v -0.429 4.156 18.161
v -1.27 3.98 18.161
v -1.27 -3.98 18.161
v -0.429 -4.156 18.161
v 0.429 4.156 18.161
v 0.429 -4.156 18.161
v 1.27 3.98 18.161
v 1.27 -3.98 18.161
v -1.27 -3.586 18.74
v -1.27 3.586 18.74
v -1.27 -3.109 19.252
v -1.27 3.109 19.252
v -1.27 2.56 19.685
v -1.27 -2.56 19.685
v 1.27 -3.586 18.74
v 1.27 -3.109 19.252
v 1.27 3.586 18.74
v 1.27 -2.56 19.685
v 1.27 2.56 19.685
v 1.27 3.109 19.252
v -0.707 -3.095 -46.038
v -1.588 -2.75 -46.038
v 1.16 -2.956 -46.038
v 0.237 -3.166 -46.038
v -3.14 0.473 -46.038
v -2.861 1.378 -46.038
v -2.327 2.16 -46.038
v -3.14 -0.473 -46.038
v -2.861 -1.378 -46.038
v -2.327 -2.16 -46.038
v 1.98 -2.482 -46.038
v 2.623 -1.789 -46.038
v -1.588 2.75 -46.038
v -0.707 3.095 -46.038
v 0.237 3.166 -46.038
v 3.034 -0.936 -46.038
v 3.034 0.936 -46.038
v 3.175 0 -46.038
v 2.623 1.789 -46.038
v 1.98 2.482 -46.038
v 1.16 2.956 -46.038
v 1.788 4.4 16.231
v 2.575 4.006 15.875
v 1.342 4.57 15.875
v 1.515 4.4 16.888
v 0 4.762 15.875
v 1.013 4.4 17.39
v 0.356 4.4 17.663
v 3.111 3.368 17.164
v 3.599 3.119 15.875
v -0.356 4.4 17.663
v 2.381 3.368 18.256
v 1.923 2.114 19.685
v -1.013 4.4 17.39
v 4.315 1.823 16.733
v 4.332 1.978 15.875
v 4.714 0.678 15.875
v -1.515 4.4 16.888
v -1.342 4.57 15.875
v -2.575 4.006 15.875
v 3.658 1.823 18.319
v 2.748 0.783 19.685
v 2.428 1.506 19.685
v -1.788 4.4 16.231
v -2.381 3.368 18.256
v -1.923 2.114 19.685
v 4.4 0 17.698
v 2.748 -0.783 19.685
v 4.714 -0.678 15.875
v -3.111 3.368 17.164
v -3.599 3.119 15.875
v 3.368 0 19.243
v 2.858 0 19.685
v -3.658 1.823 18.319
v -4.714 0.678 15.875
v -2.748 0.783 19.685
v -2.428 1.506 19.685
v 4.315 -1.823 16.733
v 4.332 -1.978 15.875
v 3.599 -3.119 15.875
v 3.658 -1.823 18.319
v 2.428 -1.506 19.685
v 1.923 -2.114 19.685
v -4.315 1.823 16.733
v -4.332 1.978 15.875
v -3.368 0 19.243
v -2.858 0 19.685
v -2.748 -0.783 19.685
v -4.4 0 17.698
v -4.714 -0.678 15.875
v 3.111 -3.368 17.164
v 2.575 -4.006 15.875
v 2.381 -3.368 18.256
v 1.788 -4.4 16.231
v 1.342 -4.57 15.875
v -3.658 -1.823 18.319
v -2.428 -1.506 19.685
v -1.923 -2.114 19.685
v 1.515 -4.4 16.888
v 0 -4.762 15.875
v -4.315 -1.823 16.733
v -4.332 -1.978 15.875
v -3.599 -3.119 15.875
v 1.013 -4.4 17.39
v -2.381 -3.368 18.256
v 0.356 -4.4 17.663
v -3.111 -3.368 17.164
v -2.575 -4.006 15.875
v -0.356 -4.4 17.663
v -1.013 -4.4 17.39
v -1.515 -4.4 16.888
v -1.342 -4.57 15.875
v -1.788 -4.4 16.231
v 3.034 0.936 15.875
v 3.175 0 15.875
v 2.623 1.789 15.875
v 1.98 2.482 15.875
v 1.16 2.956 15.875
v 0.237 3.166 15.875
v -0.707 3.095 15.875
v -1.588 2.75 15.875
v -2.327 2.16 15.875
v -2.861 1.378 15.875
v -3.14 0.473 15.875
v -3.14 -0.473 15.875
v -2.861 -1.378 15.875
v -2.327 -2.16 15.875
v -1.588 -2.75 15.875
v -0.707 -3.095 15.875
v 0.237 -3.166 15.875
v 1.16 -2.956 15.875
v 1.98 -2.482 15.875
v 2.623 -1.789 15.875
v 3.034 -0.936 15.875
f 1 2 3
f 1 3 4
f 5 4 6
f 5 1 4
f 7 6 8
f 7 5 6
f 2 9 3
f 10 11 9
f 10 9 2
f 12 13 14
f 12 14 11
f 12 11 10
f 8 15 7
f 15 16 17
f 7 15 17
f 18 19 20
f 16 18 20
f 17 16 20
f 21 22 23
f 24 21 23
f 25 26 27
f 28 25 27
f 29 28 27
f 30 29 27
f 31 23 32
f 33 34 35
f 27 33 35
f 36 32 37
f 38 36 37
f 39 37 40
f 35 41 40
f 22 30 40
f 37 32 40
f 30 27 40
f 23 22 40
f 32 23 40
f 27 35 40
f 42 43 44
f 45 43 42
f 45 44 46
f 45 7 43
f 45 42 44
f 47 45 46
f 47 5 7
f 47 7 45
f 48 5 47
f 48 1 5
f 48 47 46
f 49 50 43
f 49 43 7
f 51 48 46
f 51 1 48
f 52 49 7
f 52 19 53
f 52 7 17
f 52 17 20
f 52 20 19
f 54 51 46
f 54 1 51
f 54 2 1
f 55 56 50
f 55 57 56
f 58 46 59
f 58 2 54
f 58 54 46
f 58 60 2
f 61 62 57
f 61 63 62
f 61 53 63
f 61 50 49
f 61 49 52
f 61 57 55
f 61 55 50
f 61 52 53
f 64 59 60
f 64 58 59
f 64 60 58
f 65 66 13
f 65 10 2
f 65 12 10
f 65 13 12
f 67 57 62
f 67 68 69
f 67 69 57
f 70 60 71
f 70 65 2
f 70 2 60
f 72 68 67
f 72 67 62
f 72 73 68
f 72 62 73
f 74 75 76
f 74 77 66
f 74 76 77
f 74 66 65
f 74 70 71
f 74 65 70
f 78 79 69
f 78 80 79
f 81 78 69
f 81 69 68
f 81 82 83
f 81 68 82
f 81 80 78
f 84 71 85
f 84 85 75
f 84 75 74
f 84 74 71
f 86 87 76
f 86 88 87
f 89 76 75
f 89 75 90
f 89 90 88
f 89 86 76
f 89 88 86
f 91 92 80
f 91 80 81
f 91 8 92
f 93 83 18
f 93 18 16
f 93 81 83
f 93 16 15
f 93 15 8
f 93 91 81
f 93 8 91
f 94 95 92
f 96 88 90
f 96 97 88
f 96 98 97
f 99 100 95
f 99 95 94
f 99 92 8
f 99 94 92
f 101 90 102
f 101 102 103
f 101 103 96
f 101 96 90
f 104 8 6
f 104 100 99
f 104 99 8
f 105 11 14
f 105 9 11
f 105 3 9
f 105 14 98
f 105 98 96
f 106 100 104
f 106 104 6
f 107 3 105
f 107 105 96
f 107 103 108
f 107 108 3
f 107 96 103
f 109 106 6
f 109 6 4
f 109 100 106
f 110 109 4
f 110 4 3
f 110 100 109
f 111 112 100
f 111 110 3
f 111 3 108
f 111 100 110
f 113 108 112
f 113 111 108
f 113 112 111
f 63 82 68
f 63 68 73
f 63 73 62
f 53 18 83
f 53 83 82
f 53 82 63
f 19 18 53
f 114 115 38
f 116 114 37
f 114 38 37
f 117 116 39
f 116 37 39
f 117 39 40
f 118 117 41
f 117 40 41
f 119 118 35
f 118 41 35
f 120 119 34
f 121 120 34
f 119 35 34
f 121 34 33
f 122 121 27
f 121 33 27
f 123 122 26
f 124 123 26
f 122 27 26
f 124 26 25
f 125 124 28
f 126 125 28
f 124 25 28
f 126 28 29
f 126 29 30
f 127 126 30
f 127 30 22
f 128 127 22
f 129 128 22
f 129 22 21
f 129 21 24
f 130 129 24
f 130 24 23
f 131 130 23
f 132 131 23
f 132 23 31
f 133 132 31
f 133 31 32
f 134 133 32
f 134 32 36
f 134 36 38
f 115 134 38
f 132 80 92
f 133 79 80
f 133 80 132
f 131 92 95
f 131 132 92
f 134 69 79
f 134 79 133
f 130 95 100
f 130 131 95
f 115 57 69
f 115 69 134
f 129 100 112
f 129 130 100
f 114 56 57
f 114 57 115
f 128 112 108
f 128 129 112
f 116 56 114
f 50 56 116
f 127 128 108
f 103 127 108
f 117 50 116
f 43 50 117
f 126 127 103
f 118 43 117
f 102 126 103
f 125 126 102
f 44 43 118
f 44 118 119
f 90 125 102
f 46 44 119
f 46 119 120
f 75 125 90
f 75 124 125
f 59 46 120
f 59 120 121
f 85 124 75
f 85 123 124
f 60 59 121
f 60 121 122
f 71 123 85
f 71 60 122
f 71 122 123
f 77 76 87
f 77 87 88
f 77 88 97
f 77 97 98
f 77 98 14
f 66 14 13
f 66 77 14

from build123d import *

# Parameters (mm, degrees)
BOSS_EXTRUDE1_DEPTH      = 15.875
BOSS_EXTRUDE1_DEPTH_BACK = 46.0375
SKETCH1_R                = 3.175
REVOLVE1_ANGLE           = 180
CUT_EXTRUDE1_DEPTH       = 8.382
CUT_EXTRUDE1_DEPTH_BACK  = 9.398
SKETCH3_W                = 2.54
SKETCH3_H                = 12.7
SKETCH4_W                = 2.54
SKETCH4_H                = 12.81199514
CUT_EXTRUDE2_DEPTH       = 1.524


with BuildPart() as part:
    # Sketch1 → Boss-Extrude1 (new, two sides: drawn at the far end of the back side and taken through both)
    with BuildSketch(Plane.XY.offset(-BOSS_EXTRUDE1_DEPTH_BACK)):
        Circle(SKETCH1_R)
    extrude(amount=BOSS_EXTRUDE1_DEPTH + BOSS_EXTRUDE1_DEPTH_BACK)

    # Sketch2 → Revolve1 (revolve)
    with BuildSketch(Plane.XY.offset(15.875)):
        with BuildLine():
            Line((0, -4.7625), (0, 4.7625))
            ThreePointArc((0, 4.7625), (4.7625, 0), (0, -4.7625))
        make_face()
    revolve(axis=Axis((0, -4.7625, 15.875), (0, -1, 0)), revolution_arc=REVOLVE1_ANGLE)

    # Sketch3 → Cut-Extrude1 (cut, two sides: drawn at the far end of the back side and taken through both)
    with BuildSketch(Plane(origin=(2.54, 0, 0), x_dir=(0, 0, -1), z_dir=(1, 0, 0)).offset(-CUT_EXTRUDE1_DEPTH_BACK)):
        with Locations((-20.955, -1.5875)):
            Rectangle(SKETCH3_W, SKETCH3_H)
    extrude(amount=CUT_EXTRUDE1_DEPTH + CUT_EXTRUDE1_DEPTH_BACK, mode=Mode.SUBTRACT)

    # Sketch4 → Cut-Extrude2 (cut)
    with BuildSketch(Plane.XY.offset(19.685)):
        with Locations((0, -0.792879604)):
            Rectangle(SKETCH4_W, SKETCH4_H)
    extrude(amount=-CUT_EXTRUDE2_DEPTH, mode=Mode.SUBTRACT)


solid = part.part
